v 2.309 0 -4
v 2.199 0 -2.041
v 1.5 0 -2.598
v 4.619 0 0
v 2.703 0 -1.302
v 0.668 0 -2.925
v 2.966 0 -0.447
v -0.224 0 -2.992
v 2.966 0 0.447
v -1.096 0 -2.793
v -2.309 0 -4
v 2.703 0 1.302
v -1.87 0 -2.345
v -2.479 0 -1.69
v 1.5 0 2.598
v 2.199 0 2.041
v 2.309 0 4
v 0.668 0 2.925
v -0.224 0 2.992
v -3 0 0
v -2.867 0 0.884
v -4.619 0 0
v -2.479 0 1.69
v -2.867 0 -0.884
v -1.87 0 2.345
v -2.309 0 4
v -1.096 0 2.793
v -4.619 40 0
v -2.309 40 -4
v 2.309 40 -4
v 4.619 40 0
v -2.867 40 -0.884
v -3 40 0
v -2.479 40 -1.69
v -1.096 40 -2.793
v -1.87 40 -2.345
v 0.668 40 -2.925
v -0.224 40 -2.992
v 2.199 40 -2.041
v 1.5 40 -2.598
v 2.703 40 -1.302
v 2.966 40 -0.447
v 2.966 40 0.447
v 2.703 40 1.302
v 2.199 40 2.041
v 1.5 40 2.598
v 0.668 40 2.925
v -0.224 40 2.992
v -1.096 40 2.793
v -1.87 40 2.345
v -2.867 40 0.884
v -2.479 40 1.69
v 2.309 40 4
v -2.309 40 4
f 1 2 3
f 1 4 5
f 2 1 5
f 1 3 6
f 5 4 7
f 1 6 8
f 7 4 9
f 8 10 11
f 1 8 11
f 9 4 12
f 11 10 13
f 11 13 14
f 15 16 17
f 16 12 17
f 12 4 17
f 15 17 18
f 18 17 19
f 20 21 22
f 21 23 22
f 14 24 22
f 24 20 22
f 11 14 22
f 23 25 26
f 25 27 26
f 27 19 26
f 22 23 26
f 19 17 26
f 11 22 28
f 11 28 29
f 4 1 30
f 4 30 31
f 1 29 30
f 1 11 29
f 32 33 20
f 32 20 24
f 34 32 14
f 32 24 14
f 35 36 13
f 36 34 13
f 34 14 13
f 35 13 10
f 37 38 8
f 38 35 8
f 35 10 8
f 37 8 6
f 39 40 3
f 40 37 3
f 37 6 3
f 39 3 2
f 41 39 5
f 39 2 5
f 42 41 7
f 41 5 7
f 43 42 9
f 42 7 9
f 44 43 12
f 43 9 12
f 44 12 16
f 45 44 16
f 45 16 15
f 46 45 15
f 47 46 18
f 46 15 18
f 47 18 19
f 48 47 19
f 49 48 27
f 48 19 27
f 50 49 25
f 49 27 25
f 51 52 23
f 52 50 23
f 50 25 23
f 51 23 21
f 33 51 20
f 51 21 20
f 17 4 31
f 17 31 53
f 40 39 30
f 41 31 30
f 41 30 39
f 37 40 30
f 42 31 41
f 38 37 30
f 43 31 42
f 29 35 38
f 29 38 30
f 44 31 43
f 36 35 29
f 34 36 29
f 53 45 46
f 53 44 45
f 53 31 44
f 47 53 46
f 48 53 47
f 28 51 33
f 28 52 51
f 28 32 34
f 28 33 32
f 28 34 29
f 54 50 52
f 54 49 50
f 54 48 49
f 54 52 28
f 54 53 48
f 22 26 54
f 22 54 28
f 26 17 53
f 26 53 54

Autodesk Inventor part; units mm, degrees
ref_plane "YZ Plane" through (0, 0, 0) normal (1, 0, 0) x (0, 1, 0)
ref_plane "XZ Plane" through (0, 0, 0) normal (0, 1, 0) x (-1, 0, 0)
ref_plane "XY Plane" through (0, 0, 0) normal (0, 0, 1) x (1, 0, 0)
sketch "Эскиз1" plane through (0, 0, 0) normal (0, 1, 0) x (-1, 0, 0)
  line L0 (4.6188, 0) -> (2.3094, -4)
  line L1 (2.3094, -4) -> (-2.3094, -4)
  line L2 (-2.3094, -4) -> (-4.6188, 0)
  line L3 (-4.6188, 0) -> (-2.3094, 4)
  line L4 (-2.3094, 4) -> (2.3094, 4)
  line L5 (2.3094, 4) -> (4.6188, 0)
  circle A0 centre (0, 0) radius 3
  dimension "d0" = 8
  dimension "d1" = 8
  dimension "d2" = 6
extrude "Выдавливание1" add sketch "Эскиз1" along normal blind 40
thread "Резьба1" size "M6x1" class "6H" standard "ANSI Metric M Profile" full length
properties part number "stoyka_M6_40mm" material "Сталь нержавеющая, 440C"
